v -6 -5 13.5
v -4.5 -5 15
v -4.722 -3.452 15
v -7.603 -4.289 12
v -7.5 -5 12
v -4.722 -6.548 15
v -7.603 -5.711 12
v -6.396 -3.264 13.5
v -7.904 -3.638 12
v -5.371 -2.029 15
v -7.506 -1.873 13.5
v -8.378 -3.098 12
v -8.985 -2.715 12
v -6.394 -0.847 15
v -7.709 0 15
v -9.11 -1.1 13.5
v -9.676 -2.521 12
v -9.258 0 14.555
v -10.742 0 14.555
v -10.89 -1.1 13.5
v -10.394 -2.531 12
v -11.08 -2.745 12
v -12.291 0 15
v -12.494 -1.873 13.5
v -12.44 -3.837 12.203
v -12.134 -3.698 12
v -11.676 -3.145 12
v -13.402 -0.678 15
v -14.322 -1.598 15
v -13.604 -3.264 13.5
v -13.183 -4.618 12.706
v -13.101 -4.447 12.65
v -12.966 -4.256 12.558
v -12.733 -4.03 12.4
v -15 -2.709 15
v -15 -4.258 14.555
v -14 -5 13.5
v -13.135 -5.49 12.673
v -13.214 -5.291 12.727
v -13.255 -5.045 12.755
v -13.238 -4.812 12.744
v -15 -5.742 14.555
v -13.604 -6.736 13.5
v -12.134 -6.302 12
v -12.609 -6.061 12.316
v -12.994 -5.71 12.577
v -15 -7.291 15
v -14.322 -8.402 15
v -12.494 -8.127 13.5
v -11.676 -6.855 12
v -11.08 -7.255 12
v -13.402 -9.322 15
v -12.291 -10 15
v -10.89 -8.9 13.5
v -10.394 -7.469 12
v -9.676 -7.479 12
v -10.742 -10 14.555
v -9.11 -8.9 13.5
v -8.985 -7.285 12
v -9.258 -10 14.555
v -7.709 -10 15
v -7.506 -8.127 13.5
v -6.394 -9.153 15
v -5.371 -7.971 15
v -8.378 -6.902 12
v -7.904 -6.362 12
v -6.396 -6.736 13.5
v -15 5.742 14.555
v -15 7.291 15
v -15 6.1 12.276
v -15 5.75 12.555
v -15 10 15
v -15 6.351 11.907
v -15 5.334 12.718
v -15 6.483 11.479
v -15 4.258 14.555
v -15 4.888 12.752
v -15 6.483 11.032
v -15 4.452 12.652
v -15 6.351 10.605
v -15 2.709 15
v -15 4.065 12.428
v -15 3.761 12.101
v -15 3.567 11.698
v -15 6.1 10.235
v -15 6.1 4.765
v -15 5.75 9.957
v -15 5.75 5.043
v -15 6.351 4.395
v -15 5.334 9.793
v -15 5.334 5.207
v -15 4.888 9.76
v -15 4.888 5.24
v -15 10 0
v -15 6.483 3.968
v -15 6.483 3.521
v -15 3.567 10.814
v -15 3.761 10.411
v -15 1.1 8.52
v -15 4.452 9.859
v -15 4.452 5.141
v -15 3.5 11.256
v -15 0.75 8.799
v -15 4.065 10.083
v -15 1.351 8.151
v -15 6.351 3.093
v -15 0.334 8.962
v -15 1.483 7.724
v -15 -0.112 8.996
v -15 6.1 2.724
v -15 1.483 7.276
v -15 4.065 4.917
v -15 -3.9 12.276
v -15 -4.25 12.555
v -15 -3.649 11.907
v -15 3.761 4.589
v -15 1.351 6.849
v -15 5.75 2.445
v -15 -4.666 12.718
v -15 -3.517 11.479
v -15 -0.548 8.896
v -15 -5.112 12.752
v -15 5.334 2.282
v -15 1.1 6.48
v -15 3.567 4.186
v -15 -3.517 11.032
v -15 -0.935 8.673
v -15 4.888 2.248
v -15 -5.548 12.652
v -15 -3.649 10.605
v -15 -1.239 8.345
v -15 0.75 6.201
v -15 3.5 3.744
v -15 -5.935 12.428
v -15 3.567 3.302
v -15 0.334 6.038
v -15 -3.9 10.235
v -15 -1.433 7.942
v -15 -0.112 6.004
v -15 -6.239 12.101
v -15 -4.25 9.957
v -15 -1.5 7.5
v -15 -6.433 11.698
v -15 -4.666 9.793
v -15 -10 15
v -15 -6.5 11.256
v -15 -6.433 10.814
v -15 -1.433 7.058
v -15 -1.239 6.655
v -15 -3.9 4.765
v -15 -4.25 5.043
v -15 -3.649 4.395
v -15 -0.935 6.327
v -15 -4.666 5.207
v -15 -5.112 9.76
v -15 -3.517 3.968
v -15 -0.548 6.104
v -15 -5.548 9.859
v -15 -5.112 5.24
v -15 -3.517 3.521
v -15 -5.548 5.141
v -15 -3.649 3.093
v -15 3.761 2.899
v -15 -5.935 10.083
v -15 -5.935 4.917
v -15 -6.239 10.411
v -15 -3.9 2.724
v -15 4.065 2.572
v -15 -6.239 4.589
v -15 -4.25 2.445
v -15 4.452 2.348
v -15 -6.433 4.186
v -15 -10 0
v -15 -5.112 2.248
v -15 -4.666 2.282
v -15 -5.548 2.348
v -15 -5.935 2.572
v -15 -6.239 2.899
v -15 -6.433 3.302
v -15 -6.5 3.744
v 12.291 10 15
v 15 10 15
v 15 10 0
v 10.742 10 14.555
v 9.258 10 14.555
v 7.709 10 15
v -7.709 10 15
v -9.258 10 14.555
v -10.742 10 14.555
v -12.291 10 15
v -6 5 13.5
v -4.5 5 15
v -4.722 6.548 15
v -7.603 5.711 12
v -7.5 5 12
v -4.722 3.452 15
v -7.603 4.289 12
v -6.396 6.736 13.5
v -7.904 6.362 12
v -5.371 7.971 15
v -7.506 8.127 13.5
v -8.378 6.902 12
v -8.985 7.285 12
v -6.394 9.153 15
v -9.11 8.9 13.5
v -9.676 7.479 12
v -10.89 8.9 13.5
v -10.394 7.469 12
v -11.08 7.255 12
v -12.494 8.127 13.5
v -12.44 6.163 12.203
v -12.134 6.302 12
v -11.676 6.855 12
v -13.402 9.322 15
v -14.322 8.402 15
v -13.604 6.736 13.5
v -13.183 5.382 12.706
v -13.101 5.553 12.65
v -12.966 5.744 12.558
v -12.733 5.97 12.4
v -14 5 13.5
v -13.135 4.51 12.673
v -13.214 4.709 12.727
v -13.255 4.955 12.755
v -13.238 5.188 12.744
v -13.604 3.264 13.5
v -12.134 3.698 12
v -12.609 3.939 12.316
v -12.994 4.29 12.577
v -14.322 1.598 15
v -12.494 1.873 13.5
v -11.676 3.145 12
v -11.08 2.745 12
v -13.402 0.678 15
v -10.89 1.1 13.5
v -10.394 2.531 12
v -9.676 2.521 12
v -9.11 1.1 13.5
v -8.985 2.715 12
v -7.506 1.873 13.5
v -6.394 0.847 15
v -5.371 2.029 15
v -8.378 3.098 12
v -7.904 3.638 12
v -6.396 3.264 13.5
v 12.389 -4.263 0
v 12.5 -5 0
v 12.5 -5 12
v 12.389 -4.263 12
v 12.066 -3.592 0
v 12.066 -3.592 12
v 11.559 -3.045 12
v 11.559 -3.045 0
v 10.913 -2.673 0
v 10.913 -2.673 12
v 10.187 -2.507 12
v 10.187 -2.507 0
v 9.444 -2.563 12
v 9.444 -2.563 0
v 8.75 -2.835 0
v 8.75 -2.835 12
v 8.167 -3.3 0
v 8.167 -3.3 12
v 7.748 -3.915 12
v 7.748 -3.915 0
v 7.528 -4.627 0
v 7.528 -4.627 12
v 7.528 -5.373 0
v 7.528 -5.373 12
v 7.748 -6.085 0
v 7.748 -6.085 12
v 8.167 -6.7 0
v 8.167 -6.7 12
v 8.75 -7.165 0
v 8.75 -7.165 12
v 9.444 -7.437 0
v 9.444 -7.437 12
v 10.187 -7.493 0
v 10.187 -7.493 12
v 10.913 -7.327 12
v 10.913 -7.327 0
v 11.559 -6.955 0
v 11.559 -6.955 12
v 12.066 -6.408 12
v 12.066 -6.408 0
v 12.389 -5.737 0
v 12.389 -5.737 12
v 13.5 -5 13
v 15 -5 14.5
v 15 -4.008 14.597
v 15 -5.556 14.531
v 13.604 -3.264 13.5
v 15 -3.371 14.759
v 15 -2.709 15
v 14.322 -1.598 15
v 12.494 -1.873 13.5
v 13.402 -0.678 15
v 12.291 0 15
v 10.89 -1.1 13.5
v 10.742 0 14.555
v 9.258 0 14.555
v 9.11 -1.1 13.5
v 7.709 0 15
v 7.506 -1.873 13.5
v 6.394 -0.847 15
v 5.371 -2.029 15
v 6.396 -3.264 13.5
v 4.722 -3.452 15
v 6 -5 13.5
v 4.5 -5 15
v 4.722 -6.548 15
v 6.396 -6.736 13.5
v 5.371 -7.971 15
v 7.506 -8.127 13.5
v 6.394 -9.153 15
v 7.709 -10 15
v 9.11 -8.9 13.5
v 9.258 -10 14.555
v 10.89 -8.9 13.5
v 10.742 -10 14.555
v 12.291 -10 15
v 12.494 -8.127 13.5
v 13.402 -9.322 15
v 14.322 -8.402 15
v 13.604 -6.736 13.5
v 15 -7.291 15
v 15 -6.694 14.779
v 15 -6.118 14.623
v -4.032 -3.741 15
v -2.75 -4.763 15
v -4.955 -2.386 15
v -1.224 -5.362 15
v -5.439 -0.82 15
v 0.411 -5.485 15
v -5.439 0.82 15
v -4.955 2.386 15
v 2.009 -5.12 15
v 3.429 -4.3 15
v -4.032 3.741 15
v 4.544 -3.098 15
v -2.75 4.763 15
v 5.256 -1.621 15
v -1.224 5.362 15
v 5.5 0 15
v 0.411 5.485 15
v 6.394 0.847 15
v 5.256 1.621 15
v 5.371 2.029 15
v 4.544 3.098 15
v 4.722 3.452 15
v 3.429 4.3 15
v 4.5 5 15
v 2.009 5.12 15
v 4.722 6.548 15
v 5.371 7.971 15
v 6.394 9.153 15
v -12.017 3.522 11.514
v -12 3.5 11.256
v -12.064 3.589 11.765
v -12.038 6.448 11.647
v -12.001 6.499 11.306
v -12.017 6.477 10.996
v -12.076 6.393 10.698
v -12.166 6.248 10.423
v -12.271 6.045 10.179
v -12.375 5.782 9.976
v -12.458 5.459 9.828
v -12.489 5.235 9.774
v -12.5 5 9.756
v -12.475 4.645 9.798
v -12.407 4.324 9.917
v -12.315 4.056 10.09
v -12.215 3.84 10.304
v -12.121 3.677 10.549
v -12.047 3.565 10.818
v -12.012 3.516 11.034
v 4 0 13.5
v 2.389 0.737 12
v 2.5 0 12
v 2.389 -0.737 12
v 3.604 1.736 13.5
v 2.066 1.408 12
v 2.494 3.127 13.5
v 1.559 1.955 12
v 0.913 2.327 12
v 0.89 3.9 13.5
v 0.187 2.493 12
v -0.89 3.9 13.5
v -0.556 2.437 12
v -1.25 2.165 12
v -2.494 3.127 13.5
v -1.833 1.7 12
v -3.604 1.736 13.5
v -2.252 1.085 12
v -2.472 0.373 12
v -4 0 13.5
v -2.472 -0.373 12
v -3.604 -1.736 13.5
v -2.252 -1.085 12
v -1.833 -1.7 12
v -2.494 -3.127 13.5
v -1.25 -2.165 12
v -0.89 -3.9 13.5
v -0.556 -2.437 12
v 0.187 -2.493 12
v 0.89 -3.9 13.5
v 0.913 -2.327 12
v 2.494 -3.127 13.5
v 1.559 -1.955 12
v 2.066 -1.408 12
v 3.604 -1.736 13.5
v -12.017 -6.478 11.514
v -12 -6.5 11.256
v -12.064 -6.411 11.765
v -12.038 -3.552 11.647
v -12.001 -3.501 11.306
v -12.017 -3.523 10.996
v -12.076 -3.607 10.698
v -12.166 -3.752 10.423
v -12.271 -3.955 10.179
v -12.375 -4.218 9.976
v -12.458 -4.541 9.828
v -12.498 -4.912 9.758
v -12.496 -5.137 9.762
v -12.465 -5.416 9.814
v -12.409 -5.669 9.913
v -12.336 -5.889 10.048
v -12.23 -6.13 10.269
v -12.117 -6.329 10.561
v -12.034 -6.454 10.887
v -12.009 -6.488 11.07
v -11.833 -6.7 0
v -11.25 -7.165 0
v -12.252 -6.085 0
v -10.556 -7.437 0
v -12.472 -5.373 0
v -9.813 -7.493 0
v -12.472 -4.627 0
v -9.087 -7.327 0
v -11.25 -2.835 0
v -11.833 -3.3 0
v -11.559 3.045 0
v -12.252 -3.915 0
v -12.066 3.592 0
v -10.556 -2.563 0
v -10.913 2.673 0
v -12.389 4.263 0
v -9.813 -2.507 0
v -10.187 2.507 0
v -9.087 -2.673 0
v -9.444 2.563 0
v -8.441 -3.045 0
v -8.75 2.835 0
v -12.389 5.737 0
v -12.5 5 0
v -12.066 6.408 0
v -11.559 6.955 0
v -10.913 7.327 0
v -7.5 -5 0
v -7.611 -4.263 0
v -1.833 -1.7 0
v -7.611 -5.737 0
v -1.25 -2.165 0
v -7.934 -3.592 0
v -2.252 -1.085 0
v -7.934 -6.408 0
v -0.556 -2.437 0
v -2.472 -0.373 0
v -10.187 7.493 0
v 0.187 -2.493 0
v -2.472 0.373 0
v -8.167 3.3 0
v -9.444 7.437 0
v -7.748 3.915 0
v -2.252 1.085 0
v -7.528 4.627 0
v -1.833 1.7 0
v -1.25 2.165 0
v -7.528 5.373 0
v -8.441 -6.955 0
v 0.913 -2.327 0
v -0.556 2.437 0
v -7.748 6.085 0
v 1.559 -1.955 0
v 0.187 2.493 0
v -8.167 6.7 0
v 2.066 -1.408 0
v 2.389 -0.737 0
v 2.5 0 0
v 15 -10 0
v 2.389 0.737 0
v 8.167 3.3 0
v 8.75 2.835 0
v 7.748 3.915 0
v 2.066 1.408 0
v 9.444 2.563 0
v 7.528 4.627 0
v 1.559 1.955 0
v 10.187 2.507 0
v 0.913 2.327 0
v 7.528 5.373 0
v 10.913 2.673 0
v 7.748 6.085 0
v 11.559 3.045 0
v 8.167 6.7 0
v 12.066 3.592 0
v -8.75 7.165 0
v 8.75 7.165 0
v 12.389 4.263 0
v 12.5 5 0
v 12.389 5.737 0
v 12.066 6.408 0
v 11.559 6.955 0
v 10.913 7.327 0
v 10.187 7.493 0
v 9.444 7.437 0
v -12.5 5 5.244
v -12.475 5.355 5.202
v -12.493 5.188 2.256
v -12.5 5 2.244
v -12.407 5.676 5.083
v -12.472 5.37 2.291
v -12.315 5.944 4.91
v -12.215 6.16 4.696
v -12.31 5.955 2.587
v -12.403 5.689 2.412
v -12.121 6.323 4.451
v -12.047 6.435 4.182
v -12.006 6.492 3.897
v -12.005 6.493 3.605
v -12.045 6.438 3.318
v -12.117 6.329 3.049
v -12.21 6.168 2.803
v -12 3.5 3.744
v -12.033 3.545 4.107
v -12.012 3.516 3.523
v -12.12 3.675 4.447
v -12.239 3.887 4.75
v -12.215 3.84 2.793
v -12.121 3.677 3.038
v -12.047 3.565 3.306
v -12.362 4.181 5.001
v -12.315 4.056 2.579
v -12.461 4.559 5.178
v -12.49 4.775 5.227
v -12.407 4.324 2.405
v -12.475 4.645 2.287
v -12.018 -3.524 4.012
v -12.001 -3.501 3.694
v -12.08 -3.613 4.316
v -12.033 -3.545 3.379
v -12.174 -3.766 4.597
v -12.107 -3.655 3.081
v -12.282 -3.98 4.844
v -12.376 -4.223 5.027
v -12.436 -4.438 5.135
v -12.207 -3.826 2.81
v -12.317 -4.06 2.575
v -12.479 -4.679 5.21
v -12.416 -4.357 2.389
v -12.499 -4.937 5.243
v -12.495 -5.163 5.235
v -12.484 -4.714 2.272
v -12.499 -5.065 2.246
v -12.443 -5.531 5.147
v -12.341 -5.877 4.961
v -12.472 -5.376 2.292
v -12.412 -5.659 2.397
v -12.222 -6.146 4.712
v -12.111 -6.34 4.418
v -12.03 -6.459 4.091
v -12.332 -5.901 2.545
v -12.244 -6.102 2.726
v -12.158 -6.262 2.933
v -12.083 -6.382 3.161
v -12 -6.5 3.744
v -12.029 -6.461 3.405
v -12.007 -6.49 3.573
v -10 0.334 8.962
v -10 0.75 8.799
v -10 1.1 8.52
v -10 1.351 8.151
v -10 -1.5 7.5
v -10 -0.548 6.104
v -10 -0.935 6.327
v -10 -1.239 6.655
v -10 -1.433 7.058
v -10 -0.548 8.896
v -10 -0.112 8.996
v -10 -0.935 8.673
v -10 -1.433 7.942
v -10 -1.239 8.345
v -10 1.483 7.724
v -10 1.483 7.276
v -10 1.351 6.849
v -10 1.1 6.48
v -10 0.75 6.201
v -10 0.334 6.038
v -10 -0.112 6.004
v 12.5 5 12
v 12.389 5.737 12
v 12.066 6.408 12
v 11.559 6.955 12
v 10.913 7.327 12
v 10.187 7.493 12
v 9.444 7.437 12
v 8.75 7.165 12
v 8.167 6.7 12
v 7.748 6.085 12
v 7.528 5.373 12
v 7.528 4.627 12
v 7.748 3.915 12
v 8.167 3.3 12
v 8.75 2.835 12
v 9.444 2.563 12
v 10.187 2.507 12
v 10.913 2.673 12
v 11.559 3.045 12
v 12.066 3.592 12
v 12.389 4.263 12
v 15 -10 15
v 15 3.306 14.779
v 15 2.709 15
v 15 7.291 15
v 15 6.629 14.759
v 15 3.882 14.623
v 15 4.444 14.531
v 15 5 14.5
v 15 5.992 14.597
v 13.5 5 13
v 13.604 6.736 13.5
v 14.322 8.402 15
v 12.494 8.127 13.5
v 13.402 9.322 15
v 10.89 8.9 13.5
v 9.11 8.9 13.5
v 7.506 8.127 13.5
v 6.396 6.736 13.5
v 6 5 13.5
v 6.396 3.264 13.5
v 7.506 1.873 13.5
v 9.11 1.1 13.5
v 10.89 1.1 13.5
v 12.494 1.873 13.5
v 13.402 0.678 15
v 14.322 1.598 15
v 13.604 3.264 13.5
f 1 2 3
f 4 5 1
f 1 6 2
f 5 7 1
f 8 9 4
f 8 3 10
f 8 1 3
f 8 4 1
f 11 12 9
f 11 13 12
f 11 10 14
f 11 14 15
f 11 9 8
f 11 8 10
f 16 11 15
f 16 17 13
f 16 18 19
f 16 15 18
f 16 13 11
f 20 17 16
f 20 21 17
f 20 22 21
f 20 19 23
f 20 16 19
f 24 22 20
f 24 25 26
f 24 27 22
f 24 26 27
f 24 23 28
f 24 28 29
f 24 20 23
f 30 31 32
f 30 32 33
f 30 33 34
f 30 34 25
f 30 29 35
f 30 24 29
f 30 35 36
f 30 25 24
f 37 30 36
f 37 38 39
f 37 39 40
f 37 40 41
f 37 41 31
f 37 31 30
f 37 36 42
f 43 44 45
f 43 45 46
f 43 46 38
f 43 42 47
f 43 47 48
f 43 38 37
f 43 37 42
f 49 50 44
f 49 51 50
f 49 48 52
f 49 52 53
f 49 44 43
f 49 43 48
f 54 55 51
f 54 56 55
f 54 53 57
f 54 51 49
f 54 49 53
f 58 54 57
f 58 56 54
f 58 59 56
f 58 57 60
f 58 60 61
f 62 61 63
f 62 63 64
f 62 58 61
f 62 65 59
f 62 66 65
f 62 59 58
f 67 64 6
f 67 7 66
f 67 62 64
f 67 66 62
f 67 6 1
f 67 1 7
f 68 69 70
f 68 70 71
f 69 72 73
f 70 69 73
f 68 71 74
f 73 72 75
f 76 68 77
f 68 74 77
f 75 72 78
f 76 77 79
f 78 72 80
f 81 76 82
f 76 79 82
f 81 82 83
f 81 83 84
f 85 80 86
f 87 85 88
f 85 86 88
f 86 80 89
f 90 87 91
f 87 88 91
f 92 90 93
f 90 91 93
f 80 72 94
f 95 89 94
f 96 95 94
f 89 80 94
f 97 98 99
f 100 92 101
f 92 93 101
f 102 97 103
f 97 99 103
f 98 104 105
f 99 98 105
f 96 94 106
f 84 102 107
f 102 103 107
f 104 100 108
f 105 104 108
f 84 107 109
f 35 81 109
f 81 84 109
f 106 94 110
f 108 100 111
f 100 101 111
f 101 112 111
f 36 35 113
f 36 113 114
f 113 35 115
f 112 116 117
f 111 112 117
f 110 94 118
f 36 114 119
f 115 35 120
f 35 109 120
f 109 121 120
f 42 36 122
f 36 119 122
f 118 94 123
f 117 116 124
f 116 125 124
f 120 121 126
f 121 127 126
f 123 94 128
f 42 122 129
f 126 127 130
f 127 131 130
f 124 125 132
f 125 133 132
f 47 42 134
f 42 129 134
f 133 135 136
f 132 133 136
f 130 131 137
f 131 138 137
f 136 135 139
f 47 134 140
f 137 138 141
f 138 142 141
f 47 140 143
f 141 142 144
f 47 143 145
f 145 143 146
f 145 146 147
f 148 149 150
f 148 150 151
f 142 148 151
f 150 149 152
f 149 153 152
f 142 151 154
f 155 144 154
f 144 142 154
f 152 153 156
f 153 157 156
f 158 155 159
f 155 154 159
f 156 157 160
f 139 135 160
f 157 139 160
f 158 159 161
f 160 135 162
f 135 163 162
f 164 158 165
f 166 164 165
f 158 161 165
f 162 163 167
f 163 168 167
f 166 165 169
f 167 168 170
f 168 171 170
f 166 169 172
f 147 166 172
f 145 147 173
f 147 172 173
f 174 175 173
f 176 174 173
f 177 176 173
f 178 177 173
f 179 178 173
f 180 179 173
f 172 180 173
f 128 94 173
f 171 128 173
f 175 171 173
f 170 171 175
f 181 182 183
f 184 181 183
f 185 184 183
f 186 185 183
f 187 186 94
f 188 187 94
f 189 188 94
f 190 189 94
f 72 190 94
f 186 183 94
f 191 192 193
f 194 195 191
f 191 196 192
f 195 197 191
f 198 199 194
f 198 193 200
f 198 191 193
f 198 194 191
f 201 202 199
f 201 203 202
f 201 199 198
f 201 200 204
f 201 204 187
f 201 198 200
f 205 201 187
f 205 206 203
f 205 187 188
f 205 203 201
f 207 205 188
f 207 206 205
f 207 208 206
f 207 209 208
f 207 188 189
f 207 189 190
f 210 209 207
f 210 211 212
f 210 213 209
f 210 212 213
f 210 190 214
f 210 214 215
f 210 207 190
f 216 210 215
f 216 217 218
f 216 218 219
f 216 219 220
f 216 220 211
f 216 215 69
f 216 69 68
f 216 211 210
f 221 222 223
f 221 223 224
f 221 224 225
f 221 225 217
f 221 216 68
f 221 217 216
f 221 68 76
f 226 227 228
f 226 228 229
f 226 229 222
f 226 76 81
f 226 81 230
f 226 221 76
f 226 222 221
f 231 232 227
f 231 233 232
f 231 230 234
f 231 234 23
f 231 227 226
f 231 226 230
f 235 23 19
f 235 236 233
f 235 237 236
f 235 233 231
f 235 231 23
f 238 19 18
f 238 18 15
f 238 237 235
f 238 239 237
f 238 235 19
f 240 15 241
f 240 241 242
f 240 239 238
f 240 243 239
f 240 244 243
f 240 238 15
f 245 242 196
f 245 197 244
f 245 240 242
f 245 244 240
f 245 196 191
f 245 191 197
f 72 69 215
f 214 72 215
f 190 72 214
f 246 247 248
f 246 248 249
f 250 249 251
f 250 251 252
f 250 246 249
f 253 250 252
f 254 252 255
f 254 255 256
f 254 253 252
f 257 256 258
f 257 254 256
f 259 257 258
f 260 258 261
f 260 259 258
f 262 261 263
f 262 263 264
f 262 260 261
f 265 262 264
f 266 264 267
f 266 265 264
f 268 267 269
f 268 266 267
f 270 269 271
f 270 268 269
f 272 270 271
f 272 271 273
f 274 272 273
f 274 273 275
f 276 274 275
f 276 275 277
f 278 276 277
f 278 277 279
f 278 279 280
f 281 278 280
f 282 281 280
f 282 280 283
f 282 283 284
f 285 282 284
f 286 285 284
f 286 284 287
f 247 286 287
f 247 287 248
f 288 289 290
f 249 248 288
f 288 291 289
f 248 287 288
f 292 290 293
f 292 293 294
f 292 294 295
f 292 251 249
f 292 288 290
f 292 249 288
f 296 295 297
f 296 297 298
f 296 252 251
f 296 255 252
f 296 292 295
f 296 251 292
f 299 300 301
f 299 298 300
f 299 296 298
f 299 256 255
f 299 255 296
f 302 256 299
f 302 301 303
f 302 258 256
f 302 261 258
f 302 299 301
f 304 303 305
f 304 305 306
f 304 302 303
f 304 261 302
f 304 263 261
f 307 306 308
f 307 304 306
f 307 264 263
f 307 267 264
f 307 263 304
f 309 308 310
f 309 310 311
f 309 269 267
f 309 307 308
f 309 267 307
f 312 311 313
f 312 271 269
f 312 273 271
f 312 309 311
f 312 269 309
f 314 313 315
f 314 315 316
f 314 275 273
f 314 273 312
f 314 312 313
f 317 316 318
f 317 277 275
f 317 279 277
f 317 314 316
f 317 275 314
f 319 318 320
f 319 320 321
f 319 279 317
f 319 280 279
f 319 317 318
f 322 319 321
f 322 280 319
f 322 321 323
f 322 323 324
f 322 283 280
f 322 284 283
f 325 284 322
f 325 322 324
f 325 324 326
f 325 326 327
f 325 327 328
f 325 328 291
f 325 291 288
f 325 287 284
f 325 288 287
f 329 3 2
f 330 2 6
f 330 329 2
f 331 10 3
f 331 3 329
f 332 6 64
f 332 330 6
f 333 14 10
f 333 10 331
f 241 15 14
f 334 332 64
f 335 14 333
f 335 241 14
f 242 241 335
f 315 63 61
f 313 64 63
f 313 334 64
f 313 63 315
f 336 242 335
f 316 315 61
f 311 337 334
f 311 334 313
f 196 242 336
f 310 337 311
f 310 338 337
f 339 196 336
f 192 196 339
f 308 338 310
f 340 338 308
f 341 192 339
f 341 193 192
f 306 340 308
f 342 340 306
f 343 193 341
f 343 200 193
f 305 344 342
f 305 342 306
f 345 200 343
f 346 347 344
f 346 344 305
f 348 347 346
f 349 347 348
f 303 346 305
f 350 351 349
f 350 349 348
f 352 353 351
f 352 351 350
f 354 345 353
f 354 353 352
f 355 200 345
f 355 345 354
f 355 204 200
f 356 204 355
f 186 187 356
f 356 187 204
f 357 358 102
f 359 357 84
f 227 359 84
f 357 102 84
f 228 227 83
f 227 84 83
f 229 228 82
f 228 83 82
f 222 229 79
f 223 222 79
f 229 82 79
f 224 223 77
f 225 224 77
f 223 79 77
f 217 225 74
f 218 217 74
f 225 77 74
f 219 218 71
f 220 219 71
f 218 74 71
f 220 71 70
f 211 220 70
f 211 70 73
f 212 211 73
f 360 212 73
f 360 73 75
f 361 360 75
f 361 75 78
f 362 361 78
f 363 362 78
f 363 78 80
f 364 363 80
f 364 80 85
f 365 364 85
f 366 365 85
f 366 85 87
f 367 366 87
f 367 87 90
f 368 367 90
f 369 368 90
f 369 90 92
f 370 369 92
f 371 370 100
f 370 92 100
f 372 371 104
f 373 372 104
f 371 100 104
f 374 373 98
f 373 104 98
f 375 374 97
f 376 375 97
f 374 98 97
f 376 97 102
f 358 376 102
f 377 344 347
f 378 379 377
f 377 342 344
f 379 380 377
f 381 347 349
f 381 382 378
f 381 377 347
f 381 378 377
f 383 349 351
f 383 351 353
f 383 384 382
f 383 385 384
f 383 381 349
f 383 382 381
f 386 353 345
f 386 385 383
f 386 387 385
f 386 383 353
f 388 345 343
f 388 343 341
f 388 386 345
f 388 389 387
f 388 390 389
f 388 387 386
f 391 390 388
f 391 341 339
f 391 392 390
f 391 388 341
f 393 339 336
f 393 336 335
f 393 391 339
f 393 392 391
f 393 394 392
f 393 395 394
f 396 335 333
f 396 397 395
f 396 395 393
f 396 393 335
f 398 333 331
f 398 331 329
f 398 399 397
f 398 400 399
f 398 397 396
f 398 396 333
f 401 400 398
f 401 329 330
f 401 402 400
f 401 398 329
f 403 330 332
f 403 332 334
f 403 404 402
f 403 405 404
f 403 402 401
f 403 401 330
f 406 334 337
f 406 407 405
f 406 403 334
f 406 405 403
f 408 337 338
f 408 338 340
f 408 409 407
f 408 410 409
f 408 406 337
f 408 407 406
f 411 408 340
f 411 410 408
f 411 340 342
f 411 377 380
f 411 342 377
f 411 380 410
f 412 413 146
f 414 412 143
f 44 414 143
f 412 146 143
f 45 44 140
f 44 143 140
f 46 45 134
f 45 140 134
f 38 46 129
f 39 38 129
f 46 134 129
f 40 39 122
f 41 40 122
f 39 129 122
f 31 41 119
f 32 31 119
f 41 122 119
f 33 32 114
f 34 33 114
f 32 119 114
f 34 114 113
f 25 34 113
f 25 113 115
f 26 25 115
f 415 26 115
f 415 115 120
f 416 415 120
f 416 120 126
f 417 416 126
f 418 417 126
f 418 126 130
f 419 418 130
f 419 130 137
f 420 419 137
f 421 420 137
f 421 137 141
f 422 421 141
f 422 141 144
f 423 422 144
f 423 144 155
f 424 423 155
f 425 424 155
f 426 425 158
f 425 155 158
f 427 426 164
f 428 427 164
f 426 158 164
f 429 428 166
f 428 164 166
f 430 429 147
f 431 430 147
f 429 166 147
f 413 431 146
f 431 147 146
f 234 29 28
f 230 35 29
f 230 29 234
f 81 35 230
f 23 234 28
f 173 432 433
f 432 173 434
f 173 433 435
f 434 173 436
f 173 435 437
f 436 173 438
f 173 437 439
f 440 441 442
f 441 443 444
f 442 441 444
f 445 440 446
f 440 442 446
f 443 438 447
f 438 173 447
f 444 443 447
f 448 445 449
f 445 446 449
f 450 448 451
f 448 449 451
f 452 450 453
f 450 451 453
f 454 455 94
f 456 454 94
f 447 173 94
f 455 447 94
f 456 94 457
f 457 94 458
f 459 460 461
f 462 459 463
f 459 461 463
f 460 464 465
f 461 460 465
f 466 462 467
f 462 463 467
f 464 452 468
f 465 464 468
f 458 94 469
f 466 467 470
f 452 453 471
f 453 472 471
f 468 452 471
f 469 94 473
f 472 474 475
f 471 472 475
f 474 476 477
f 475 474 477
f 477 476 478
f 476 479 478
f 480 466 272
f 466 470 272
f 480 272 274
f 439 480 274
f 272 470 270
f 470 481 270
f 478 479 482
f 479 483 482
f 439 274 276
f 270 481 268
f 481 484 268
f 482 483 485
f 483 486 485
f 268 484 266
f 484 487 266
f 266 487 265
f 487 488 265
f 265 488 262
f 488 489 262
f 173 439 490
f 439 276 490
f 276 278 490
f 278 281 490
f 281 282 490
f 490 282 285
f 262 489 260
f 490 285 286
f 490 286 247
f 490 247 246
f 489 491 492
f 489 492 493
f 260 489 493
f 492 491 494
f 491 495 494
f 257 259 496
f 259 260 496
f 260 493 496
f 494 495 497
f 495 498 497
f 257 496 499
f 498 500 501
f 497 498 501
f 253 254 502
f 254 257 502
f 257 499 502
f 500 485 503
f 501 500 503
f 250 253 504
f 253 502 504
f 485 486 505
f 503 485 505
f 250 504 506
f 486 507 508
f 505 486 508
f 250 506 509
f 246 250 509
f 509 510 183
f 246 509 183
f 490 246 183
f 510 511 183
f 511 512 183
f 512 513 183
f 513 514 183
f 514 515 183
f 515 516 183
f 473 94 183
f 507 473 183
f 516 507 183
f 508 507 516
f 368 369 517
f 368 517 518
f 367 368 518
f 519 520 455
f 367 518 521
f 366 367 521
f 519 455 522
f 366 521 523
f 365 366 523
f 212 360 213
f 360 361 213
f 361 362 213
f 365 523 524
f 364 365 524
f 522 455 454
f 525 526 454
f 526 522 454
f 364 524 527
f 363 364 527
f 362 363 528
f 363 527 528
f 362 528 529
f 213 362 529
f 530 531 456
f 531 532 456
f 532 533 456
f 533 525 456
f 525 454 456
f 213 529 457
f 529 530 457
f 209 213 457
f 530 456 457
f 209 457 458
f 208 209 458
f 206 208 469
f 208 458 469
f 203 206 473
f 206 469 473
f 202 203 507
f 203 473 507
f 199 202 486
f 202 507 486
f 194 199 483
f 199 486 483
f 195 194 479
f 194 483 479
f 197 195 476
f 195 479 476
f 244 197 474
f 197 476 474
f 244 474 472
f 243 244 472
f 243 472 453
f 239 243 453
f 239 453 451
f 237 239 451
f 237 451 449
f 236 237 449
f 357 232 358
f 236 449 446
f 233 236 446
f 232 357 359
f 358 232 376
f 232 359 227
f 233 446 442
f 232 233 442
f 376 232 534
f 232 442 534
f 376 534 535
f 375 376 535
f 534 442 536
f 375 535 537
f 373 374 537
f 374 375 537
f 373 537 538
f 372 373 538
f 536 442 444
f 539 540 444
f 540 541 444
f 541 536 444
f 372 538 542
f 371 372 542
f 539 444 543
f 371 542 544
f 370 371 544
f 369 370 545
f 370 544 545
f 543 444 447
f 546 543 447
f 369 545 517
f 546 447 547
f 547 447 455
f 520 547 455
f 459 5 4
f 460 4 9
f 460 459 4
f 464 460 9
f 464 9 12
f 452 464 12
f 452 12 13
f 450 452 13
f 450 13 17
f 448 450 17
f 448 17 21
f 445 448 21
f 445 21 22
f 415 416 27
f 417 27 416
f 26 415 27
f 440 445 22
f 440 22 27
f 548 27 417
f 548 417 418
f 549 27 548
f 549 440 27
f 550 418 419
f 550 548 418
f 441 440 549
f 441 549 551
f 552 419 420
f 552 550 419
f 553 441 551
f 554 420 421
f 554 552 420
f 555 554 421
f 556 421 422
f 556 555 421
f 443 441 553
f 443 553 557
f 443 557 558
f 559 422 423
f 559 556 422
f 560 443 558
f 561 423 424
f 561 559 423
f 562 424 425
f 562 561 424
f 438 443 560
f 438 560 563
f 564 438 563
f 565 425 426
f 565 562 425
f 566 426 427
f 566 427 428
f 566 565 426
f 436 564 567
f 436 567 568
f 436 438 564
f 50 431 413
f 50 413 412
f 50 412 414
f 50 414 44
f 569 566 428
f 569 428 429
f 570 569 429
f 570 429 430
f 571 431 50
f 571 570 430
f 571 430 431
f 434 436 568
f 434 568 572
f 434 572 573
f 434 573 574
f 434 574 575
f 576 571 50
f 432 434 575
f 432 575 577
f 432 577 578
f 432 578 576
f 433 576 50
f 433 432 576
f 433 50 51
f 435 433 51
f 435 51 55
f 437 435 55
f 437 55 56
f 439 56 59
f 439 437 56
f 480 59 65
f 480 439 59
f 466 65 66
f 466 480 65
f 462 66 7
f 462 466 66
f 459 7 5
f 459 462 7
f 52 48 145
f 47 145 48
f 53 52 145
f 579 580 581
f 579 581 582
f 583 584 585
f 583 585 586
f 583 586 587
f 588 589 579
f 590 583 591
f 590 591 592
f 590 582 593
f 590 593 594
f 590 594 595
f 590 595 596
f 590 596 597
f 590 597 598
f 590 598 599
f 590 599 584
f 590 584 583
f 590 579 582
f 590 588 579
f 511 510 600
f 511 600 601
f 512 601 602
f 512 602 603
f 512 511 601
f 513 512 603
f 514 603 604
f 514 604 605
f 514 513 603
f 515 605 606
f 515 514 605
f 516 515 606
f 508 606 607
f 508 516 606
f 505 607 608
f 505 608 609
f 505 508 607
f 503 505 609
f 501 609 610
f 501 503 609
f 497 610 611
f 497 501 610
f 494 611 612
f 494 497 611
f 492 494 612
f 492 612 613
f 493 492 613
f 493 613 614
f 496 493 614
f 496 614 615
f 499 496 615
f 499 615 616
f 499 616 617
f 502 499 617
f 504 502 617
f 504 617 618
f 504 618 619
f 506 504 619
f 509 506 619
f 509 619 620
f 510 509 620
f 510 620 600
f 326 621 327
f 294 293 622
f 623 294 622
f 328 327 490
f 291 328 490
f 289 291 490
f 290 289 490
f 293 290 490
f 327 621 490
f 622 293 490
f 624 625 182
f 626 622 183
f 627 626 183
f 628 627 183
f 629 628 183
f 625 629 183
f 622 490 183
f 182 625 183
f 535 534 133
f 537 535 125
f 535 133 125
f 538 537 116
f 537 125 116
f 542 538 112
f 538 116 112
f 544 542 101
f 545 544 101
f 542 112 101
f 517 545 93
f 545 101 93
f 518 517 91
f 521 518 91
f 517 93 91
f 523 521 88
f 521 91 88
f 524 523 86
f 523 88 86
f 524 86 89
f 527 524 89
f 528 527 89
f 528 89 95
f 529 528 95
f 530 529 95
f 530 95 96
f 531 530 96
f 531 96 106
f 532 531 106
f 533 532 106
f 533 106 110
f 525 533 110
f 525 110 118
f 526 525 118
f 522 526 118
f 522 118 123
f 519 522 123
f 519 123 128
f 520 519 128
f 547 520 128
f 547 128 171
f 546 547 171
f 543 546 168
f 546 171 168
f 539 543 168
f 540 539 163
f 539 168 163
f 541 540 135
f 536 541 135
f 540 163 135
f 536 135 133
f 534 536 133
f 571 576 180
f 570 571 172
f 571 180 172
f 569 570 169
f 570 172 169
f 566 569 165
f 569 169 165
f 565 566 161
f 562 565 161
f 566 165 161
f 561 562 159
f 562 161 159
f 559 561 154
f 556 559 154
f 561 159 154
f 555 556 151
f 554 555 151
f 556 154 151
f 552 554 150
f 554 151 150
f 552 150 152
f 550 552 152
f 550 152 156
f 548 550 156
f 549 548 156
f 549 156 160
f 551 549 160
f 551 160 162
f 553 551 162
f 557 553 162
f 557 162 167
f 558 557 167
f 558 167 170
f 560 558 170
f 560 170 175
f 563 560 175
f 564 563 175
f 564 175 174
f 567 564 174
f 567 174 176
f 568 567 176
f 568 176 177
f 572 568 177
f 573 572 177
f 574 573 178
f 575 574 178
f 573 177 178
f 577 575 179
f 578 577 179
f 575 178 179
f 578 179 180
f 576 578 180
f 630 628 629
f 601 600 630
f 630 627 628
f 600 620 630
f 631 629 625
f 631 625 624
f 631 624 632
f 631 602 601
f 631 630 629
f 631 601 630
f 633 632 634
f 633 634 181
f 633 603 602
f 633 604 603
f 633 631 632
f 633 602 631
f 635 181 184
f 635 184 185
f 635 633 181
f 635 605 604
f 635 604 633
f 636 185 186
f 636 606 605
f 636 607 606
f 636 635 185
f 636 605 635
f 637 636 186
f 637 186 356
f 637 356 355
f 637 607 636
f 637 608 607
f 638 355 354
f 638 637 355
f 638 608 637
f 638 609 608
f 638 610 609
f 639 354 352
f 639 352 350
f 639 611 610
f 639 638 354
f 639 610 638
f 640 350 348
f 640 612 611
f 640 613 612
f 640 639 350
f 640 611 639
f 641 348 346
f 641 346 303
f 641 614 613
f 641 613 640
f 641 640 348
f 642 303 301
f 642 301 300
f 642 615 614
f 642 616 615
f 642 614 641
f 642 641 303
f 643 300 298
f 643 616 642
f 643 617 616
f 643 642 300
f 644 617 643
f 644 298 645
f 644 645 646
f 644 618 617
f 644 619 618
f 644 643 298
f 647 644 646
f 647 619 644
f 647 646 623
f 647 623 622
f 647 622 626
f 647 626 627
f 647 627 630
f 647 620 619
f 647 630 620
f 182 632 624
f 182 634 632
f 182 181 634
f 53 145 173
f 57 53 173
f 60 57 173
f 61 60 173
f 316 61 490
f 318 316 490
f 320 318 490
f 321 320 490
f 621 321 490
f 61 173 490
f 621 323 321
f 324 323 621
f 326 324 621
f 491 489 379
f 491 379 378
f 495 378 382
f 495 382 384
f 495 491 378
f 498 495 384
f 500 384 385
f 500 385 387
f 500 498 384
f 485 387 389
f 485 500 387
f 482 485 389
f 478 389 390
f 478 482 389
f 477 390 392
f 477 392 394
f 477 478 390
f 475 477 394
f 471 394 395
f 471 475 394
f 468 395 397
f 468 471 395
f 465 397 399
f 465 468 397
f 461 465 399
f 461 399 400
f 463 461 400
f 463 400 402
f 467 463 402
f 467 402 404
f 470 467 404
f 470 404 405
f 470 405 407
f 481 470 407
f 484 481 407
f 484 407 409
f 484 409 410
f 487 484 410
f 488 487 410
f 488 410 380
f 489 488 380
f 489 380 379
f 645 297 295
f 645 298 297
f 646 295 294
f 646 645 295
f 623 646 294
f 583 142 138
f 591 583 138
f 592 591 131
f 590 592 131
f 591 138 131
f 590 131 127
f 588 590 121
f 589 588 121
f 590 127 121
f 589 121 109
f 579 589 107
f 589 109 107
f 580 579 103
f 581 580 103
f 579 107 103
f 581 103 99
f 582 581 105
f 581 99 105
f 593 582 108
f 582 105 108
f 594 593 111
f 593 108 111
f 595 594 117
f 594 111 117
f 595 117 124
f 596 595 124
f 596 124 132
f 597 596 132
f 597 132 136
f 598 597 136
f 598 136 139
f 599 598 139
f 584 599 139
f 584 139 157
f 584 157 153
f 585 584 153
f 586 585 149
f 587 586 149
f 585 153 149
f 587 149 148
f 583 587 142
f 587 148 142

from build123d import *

# Parameters (mm, degrees)
F0_R     = 2.5
F1_DEPTH = 15
F3_R     = 1.5
F4_DEPTH = 5


# Not quite as in the source:
# - a fillet or chamfer that OpenCascade refuses, or shapes differently, is made with other operations: its cross-section is extruded or revolved along the edge and cut away or added


with BuildPart() as f1:
    # F0 (on Top) → F1 (new body)
    with BuildSketch(Plane.XY):
        Polygon((-5, 10), (-15, 10), (-15, 5), (-15, -10), (15, -10), (15, 10), align=None)
        with Locations((-10, -5)):
            Circle(F0_R, mode=Mode.SUBTRACT)
        with Locations((10, -5)):
            Circle(F0_R, mode=Mode.SUBTRACT)
        with BuildLine():
            ThreePointArc((-7.5, 5), (-10, 2.5), (-12.5, 5))
            ThreePointArc((-12.5, 5), (-10, 7.5), (-7.5, 5))
        make_face(mode=Mode.SUBTRACT)
        Circle(F0_R, mode=Mode.SUBTRACT)
        with Locations((10, 5)):
            Circle(F0_R, mode=Mode.SUBTRACT)
    extrude(amount=F1_DEPTH)

    # F2: chamfer of 3 on 5 edges, made by hand

    # F2_s1 → F2_t2 (revolve, cut)
    with BuildSketch(Plane.XZ.offset(-5)):
        Polygon((-4.5, 15), (-7.5, 12), (-7.5, 15), align=None)
    revolve(axis=Axis((-10, 5, 15), (0, 0, 1)), mode=Mode.SUBTRACT)

    # F2_s3 → F2_t4 (revolve, cut)
    with BuildSketch(Plane.XZ):
        Polygon((5.5, 15), (2.5, 12), (2.5, 15), align=None)
    revolve(axis=Axis((0, 0, 15), (0, 0, 1)), mode=Mode.SUBTRACT)

    # F2_s5 → F2_t6 (revolve, cut)
    with BuildSketch(Plane.XZ.offset(5)):
        Polygon((-4.5, 15), (-7.5, 12), (-7.5, 15), align=None)
    revolve(axis=Axis((-10, -5, 15), (0, 0, 1)), mode=Mode.SUBTRACT)

    # F2_s7 → F2_t8 (revolve, cut)
    with BuildSketch(Plane.XZ.offset(-5)):
        Polygon((15.5, 15), (12.5, 12), (12.5, 15), align=None)
    revolve(axis=Axis((10, 5, 15), (0, 0, 1)), mode=Mode.SUBTRACT)

    # F2_s9 → F2_t10 (revolve, cut)
    with BuildSketch(Plane.XZ.offset(5)):
        Polygon((15.5, 15), (12.5, 12), (12.5, 15), align=None)
    revolve(axis=Axis((10, -5, 15), (0, 0, 1)), mode=Mode.SUBTRACT)

    # F3 (on face) → F4 (cut)
    with BuildSketch(Plane(origin=(-15, 0, 0), x_dir=(0, -1, 0), z_dir=(-1, 0, 0))):
        with Locations((0, 7.5)):
            Circle(F3_R)
        with Locations((-5, 11.2557266839)):
            Circle(F3_R)
        with Locations((-5, 3.7442733161)):
            Circle(F3_R)
        with Locations((5, 11.2557266839)):
            Circle(F3_R)
        with Locations((5, 3.7442733161)):
            Circle(F3_R)
    extrude(amount=-F4_DEPTH, mode=Mode.SUBTRACT)


solid = f1.part
